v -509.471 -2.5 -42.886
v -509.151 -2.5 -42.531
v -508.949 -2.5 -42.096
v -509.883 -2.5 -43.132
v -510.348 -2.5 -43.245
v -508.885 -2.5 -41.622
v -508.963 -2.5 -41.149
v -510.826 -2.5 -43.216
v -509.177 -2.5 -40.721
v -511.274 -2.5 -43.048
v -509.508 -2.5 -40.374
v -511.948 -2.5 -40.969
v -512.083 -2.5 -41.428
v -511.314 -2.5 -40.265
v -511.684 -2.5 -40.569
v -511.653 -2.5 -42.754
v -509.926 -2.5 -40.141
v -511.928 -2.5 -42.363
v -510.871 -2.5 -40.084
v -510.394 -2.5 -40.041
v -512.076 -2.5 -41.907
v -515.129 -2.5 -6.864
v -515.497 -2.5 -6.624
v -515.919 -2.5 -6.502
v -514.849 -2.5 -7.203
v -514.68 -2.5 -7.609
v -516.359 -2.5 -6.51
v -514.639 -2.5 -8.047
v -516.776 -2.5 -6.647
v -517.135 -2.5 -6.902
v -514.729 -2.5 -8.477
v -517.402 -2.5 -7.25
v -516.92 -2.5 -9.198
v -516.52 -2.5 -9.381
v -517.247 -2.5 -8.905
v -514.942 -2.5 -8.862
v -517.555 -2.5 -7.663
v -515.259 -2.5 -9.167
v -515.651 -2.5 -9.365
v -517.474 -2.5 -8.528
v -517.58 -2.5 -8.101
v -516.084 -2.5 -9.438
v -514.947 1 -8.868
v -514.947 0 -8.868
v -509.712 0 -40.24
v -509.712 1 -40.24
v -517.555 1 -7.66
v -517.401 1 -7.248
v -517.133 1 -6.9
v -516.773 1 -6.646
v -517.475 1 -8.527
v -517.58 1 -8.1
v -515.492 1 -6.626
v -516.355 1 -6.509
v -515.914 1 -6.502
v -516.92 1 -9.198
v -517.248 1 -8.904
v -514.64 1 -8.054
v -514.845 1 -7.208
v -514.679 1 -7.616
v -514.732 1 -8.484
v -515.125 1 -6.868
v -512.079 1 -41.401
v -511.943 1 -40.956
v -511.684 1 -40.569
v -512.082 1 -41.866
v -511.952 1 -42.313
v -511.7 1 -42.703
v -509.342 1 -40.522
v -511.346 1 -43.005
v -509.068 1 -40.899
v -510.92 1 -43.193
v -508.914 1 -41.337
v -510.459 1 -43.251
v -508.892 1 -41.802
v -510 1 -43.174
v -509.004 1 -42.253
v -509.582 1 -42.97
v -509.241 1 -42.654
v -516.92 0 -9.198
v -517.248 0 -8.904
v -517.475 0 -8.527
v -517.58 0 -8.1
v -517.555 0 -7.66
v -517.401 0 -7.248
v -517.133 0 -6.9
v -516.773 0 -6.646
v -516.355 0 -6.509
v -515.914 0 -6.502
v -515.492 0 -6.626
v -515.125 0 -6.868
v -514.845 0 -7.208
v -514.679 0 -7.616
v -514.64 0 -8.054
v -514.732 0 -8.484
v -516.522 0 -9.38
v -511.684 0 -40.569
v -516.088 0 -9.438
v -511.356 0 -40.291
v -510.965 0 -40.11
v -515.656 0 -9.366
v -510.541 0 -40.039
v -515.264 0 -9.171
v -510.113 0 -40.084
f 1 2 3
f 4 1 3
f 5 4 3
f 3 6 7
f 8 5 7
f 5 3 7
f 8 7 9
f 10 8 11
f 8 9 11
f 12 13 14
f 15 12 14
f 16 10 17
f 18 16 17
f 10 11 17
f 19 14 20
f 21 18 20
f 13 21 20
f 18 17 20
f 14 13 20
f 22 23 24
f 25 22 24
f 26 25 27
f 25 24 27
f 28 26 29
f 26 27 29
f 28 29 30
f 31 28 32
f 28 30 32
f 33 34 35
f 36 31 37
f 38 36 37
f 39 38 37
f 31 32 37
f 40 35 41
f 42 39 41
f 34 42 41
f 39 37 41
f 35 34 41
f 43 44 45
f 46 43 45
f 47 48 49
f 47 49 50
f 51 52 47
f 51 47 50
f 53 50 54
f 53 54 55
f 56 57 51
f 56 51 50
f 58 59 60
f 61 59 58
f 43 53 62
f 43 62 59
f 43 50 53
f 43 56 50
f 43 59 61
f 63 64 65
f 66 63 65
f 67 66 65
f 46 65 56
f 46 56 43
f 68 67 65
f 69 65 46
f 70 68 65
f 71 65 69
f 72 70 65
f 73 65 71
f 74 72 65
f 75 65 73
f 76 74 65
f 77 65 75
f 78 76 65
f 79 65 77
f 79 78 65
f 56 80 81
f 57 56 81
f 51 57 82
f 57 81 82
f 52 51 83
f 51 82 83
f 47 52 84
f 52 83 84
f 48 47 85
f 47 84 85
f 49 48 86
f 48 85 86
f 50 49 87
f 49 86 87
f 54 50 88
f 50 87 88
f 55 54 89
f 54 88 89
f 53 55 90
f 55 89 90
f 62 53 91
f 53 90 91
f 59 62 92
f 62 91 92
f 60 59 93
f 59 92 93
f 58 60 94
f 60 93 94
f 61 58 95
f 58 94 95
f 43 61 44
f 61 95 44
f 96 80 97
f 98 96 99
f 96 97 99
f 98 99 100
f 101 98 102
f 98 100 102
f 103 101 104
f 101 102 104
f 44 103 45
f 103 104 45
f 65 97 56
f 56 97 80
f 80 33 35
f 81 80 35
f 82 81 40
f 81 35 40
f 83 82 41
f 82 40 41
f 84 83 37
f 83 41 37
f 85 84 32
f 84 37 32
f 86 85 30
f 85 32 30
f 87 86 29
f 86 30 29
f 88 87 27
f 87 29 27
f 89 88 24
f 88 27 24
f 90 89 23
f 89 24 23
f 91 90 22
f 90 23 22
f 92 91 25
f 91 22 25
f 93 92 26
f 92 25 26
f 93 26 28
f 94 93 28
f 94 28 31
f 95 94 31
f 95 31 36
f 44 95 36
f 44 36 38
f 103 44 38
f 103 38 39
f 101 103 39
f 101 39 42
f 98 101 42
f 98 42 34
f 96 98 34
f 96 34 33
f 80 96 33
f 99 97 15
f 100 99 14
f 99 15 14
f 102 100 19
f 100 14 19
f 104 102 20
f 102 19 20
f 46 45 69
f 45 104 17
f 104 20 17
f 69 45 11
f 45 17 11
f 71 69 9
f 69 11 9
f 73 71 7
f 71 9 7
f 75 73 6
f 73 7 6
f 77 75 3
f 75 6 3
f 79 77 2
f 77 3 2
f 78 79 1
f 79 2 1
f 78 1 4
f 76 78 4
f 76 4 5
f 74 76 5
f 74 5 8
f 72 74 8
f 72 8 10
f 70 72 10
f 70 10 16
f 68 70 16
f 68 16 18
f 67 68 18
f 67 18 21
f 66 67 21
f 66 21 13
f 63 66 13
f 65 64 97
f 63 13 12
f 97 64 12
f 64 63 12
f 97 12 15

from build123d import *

# Parameters (mm, degrees)
SKETCH1_R           = 1.606483672
SKETCH1_R_2         = 1.474719506
BOSS_EXTRUDE1_DEPTH = 1
BOSS_EXTRUDE2_START = -2.5
SKETCH1_3_R         = 1.474719506
SKETCH1_3_R_2       = 1.606483672
BOSS_EXTRUDE2_DEPTH = 2.5


with BuildPart() as part:
    # Sketch1 → Boss-Extrude1 (new body)
    with BuildSketch(Plane(origin=(0, 0, 0), x_dir=(1, 0, 0), z_dir=(0, 1, 0))):
        with BuildLine():
            ThreePointArc((-516.919741048, 9.197616983), (-515.869047512, 9.418519621), (-514.947021866, 8.868407277))
            Line((-514.947021866, 8.868407277), (-509.711678857, 40.240087315))
            ThreePointArc((-509.711678857, 40.240087315), (-510.755516658, 40.060266208), (-511.684398038, 40.569297021))
            Line((-511.684398038, 40.569297021), (-516.919741048, 9.197616983))
        make_face()
        with Locations((-510.491081649, 41.644836785)):
            Circle(SKETCH1_R)
        with Locations((-516.1117935, 7.963915892)):
            Circle(SKETCH1_R_2)
    extrude(amount=BOSS_EXTRUDE1_DEPTH)

    # Sketch1<3> → Boss-Extrude2 (add)
    with BuildSketch(Plane(origin=(0, 0, 0), x_dir=(1, 0, 0), z_dir=(0, 1, 0)).offset(BOSS_EXTRUDE2_START)):
        with Locations((-516.1117935, 7.963915892)):
            Circle(SKETCH1_3_R)
        with Locations((-510.491081649, 41.644836785)):
            Circle(SKETCH1_3_R_2)
    extrude(amount=BOSS_EXTRUDE2_DEPTH)


solid = part.part
